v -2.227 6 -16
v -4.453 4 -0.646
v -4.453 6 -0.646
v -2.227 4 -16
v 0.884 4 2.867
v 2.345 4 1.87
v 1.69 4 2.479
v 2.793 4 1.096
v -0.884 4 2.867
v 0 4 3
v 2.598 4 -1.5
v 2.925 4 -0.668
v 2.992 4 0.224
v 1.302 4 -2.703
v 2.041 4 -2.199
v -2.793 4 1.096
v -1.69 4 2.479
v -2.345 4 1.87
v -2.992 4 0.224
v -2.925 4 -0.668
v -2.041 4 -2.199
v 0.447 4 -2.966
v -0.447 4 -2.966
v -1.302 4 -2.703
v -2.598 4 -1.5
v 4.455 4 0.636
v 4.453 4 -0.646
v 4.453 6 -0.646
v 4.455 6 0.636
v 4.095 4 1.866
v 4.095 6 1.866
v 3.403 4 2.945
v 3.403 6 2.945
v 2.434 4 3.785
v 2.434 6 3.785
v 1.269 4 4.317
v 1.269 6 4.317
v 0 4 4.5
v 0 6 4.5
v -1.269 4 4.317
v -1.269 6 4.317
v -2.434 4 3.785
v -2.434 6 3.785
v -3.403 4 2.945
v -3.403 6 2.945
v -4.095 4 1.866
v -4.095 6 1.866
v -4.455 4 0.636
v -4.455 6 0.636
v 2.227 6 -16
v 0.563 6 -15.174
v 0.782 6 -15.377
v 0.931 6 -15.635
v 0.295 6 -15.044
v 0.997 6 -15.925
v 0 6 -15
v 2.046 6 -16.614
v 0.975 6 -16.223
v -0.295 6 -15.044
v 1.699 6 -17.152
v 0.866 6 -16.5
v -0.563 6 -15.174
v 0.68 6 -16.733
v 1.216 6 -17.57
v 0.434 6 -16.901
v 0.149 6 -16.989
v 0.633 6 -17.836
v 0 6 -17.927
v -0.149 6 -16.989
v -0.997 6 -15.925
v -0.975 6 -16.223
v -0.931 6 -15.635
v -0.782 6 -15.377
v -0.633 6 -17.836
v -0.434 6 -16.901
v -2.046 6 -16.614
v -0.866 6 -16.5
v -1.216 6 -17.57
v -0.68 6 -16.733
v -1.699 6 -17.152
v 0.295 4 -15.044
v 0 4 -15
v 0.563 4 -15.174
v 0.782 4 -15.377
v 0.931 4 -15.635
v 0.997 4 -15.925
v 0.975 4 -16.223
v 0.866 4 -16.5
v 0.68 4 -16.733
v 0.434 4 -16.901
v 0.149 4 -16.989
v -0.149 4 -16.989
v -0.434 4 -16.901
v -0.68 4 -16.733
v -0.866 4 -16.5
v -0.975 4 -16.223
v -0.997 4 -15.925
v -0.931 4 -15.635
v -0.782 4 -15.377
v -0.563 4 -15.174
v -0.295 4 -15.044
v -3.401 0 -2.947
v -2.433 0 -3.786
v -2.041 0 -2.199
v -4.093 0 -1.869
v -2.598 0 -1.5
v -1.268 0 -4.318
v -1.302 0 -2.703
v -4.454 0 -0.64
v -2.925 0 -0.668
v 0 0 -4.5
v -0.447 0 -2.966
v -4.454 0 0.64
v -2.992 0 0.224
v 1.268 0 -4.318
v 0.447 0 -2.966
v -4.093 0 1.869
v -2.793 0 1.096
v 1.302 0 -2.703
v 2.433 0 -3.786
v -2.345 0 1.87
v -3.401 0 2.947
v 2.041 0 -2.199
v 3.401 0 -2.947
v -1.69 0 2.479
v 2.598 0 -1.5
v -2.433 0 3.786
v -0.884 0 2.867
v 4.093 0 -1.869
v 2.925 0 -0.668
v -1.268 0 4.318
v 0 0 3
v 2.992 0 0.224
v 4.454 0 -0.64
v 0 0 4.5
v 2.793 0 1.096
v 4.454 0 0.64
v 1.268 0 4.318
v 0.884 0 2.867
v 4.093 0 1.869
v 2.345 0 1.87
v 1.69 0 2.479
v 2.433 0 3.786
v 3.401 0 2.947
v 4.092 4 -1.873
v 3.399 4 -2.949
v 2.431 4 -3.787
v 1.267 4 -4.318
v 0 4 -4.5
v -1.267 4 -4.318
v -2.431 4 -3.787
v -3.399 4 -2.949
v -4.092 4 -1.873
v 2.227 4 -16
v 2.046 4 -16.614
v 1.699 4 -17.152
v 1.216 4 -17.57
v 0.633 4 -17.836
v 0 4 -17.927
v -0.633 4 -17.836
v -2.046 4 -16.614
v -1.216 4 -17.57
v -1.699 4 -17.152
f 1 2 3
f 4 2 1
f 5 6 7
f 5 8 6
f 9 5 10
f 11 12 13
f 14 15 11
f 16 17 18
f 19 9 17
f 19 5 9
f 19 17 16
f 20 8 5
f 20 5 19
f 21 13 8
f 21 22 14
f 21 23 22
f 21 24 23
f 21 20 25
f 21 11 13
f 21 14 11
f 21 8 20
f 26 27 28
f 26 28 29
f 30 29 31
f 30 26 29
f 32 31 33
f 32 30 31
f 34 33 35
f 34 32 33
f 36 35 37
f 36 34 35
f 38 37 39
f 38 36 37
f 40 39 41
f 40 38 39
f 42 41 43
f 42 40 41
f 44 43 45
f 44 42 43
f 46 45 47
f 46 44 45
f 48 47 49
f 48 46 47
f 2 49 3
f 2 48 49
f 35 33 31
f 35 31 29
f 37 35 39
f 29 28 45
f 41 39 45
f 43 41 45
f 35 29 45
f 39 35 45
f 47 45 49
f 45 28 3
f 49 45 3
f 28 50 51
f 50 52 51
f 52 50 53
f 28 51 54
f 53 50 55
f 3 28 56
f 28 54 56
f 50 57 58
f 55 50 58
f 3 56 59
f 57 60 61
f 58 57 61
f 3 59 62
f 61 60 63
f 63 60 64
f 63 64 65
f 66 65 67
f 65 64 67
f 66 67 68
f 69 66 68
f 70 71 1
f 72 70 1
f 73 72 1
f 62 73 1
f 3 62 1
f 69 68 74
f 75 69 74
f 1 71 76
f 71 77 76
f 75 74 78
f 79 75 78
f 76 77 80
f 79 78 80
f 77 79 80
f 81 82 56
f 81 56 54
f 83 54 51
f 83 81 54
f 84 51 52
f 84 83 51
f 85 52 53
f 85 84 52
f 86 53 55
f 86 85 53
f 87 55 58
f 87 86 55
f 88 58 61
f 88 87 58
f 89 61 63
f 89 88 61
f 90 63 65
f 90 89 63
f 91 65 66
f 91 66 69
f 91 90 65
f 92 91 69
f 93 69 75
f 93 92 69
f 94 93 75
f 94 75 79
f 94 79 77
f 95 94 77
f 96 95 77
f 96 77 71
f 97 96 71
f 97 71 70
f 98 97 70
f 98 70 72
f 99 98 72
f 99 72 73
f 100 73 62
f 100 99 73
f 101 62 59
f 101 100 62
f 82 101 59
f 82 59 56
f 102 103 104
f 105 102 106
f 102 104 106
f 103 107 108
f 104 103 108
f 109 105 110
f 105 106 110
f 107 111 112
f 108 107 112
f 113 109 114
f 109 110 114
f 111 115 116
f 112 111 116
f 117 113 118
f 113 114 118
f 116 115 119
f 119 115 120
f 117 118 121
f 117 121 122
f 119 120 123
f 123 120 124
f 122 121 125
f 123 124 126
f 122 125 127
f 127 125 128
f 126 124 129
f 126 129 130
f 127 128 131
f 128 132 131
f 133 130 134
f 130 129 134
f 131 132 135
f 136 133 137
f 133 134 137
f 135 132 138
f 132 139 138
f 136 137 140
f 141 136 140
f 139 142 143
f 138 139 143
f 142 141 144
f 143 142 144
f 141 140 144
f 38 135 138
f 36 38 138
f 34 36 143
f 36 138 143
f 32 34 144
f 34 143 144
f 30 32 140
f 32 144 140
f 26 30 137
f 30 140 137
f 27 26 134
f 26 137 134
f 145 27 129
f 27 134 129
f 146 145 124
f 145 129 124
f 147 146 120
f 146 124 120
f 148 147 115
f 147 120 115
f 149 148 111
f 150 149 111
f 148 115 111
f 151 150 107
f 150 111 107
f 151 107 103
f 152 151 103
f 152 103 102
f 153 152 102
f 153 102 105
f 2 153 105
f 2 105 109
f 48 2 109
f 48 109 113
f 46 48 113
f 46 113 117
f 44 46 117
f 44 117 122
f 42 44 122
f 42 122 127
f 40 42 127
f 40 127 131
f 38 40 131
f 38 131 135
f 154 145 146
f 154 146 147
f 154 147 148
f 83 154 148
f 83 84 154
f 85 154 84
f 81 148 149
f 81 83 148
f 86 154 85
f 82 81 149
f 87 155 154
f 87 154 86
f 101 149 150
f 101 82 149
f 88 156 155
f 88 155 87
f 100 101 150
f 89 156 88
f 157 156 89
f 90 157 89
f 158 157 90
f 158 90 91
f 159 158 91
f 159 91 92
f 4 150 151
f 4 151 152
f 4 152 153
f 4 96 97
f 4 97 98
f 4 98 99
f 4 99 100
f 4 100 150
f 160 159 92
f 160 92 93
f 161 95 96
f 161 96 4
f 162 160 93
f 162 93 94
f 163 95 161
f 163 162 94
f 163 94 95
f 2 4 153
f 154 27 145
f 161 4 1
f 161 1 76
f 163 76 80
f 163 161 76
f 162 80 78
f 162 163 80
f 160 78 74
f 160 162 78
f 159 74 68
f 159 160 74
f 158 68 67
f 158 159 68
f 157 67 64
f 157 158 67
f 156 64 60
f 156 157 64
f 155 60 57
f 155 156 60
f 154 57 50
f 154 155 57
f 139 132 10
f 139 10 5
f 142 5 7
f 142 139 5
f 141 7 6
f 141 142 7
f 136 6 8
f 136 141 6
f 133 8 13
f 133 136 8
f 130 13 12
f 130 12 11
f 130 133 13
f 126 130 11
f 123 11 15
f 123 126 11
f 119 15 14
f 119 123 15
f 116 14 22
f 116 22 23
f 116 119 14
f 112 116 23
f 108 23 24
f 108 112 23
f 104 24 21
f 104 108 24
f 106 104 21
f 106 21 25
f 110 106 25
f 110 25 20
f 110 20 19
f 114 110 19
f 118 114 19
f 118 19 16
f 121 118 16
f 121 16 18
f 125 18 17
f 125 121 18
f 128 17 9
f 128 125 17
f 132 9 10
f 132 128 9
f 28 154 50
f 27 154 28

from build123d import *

# Parameters (mm, degrees)
SKETCH1_R           = 4.5
SKETCH1_R_2         = 3
BOSS_EXTRUDE1_DEPTH = 4
SKETCH2_R           = 1
BOSS_EXTRUDE2_DEPTH = 2


with BuildPart() as part:
    # Sketch1 → Boss-Extrude1 (new body)
    with BuildSketch(Plane(origin=(0, 0, 0), x_dir=(1, 0, 0), z_dir=(0, 1, 0))):
        Circle(SKETCH1_R)
        Circle(SKETCH1_R_2, mode=Mode.SUBTRACT)
    extrude(amount=BOSS_EXTRUDE1_DEPTH)

    # Sketch2 → Boss-Extrude2 (add)
    with BuildSketch(Plane(origin=(0, 4, 0), x_dir=(1, 0, 0), z_dir=(0, 1, 0))):
        with BuildLine():
            Line((-4.453412293, 0.645847467), (-2.226706146, 16))
            ThreePointArc((-2.226706146, 16), (0, 17.927076266), (2.226706146, 16))
            Line((2.226706146, 16), (4.453412293, 0.645847467))
            ThreePointArc((4.453412293, 0.645847467), (0, -4.5), (-4.453412293, 0.645847467))
        make_face()
        with Locations((0, 16)):
            Circle(SKETCH2_R, mode=Mode.SUBTRACT)
    extrude(amount=BOSS_EXTRUDE2_DEPTH)


solid = part.part
